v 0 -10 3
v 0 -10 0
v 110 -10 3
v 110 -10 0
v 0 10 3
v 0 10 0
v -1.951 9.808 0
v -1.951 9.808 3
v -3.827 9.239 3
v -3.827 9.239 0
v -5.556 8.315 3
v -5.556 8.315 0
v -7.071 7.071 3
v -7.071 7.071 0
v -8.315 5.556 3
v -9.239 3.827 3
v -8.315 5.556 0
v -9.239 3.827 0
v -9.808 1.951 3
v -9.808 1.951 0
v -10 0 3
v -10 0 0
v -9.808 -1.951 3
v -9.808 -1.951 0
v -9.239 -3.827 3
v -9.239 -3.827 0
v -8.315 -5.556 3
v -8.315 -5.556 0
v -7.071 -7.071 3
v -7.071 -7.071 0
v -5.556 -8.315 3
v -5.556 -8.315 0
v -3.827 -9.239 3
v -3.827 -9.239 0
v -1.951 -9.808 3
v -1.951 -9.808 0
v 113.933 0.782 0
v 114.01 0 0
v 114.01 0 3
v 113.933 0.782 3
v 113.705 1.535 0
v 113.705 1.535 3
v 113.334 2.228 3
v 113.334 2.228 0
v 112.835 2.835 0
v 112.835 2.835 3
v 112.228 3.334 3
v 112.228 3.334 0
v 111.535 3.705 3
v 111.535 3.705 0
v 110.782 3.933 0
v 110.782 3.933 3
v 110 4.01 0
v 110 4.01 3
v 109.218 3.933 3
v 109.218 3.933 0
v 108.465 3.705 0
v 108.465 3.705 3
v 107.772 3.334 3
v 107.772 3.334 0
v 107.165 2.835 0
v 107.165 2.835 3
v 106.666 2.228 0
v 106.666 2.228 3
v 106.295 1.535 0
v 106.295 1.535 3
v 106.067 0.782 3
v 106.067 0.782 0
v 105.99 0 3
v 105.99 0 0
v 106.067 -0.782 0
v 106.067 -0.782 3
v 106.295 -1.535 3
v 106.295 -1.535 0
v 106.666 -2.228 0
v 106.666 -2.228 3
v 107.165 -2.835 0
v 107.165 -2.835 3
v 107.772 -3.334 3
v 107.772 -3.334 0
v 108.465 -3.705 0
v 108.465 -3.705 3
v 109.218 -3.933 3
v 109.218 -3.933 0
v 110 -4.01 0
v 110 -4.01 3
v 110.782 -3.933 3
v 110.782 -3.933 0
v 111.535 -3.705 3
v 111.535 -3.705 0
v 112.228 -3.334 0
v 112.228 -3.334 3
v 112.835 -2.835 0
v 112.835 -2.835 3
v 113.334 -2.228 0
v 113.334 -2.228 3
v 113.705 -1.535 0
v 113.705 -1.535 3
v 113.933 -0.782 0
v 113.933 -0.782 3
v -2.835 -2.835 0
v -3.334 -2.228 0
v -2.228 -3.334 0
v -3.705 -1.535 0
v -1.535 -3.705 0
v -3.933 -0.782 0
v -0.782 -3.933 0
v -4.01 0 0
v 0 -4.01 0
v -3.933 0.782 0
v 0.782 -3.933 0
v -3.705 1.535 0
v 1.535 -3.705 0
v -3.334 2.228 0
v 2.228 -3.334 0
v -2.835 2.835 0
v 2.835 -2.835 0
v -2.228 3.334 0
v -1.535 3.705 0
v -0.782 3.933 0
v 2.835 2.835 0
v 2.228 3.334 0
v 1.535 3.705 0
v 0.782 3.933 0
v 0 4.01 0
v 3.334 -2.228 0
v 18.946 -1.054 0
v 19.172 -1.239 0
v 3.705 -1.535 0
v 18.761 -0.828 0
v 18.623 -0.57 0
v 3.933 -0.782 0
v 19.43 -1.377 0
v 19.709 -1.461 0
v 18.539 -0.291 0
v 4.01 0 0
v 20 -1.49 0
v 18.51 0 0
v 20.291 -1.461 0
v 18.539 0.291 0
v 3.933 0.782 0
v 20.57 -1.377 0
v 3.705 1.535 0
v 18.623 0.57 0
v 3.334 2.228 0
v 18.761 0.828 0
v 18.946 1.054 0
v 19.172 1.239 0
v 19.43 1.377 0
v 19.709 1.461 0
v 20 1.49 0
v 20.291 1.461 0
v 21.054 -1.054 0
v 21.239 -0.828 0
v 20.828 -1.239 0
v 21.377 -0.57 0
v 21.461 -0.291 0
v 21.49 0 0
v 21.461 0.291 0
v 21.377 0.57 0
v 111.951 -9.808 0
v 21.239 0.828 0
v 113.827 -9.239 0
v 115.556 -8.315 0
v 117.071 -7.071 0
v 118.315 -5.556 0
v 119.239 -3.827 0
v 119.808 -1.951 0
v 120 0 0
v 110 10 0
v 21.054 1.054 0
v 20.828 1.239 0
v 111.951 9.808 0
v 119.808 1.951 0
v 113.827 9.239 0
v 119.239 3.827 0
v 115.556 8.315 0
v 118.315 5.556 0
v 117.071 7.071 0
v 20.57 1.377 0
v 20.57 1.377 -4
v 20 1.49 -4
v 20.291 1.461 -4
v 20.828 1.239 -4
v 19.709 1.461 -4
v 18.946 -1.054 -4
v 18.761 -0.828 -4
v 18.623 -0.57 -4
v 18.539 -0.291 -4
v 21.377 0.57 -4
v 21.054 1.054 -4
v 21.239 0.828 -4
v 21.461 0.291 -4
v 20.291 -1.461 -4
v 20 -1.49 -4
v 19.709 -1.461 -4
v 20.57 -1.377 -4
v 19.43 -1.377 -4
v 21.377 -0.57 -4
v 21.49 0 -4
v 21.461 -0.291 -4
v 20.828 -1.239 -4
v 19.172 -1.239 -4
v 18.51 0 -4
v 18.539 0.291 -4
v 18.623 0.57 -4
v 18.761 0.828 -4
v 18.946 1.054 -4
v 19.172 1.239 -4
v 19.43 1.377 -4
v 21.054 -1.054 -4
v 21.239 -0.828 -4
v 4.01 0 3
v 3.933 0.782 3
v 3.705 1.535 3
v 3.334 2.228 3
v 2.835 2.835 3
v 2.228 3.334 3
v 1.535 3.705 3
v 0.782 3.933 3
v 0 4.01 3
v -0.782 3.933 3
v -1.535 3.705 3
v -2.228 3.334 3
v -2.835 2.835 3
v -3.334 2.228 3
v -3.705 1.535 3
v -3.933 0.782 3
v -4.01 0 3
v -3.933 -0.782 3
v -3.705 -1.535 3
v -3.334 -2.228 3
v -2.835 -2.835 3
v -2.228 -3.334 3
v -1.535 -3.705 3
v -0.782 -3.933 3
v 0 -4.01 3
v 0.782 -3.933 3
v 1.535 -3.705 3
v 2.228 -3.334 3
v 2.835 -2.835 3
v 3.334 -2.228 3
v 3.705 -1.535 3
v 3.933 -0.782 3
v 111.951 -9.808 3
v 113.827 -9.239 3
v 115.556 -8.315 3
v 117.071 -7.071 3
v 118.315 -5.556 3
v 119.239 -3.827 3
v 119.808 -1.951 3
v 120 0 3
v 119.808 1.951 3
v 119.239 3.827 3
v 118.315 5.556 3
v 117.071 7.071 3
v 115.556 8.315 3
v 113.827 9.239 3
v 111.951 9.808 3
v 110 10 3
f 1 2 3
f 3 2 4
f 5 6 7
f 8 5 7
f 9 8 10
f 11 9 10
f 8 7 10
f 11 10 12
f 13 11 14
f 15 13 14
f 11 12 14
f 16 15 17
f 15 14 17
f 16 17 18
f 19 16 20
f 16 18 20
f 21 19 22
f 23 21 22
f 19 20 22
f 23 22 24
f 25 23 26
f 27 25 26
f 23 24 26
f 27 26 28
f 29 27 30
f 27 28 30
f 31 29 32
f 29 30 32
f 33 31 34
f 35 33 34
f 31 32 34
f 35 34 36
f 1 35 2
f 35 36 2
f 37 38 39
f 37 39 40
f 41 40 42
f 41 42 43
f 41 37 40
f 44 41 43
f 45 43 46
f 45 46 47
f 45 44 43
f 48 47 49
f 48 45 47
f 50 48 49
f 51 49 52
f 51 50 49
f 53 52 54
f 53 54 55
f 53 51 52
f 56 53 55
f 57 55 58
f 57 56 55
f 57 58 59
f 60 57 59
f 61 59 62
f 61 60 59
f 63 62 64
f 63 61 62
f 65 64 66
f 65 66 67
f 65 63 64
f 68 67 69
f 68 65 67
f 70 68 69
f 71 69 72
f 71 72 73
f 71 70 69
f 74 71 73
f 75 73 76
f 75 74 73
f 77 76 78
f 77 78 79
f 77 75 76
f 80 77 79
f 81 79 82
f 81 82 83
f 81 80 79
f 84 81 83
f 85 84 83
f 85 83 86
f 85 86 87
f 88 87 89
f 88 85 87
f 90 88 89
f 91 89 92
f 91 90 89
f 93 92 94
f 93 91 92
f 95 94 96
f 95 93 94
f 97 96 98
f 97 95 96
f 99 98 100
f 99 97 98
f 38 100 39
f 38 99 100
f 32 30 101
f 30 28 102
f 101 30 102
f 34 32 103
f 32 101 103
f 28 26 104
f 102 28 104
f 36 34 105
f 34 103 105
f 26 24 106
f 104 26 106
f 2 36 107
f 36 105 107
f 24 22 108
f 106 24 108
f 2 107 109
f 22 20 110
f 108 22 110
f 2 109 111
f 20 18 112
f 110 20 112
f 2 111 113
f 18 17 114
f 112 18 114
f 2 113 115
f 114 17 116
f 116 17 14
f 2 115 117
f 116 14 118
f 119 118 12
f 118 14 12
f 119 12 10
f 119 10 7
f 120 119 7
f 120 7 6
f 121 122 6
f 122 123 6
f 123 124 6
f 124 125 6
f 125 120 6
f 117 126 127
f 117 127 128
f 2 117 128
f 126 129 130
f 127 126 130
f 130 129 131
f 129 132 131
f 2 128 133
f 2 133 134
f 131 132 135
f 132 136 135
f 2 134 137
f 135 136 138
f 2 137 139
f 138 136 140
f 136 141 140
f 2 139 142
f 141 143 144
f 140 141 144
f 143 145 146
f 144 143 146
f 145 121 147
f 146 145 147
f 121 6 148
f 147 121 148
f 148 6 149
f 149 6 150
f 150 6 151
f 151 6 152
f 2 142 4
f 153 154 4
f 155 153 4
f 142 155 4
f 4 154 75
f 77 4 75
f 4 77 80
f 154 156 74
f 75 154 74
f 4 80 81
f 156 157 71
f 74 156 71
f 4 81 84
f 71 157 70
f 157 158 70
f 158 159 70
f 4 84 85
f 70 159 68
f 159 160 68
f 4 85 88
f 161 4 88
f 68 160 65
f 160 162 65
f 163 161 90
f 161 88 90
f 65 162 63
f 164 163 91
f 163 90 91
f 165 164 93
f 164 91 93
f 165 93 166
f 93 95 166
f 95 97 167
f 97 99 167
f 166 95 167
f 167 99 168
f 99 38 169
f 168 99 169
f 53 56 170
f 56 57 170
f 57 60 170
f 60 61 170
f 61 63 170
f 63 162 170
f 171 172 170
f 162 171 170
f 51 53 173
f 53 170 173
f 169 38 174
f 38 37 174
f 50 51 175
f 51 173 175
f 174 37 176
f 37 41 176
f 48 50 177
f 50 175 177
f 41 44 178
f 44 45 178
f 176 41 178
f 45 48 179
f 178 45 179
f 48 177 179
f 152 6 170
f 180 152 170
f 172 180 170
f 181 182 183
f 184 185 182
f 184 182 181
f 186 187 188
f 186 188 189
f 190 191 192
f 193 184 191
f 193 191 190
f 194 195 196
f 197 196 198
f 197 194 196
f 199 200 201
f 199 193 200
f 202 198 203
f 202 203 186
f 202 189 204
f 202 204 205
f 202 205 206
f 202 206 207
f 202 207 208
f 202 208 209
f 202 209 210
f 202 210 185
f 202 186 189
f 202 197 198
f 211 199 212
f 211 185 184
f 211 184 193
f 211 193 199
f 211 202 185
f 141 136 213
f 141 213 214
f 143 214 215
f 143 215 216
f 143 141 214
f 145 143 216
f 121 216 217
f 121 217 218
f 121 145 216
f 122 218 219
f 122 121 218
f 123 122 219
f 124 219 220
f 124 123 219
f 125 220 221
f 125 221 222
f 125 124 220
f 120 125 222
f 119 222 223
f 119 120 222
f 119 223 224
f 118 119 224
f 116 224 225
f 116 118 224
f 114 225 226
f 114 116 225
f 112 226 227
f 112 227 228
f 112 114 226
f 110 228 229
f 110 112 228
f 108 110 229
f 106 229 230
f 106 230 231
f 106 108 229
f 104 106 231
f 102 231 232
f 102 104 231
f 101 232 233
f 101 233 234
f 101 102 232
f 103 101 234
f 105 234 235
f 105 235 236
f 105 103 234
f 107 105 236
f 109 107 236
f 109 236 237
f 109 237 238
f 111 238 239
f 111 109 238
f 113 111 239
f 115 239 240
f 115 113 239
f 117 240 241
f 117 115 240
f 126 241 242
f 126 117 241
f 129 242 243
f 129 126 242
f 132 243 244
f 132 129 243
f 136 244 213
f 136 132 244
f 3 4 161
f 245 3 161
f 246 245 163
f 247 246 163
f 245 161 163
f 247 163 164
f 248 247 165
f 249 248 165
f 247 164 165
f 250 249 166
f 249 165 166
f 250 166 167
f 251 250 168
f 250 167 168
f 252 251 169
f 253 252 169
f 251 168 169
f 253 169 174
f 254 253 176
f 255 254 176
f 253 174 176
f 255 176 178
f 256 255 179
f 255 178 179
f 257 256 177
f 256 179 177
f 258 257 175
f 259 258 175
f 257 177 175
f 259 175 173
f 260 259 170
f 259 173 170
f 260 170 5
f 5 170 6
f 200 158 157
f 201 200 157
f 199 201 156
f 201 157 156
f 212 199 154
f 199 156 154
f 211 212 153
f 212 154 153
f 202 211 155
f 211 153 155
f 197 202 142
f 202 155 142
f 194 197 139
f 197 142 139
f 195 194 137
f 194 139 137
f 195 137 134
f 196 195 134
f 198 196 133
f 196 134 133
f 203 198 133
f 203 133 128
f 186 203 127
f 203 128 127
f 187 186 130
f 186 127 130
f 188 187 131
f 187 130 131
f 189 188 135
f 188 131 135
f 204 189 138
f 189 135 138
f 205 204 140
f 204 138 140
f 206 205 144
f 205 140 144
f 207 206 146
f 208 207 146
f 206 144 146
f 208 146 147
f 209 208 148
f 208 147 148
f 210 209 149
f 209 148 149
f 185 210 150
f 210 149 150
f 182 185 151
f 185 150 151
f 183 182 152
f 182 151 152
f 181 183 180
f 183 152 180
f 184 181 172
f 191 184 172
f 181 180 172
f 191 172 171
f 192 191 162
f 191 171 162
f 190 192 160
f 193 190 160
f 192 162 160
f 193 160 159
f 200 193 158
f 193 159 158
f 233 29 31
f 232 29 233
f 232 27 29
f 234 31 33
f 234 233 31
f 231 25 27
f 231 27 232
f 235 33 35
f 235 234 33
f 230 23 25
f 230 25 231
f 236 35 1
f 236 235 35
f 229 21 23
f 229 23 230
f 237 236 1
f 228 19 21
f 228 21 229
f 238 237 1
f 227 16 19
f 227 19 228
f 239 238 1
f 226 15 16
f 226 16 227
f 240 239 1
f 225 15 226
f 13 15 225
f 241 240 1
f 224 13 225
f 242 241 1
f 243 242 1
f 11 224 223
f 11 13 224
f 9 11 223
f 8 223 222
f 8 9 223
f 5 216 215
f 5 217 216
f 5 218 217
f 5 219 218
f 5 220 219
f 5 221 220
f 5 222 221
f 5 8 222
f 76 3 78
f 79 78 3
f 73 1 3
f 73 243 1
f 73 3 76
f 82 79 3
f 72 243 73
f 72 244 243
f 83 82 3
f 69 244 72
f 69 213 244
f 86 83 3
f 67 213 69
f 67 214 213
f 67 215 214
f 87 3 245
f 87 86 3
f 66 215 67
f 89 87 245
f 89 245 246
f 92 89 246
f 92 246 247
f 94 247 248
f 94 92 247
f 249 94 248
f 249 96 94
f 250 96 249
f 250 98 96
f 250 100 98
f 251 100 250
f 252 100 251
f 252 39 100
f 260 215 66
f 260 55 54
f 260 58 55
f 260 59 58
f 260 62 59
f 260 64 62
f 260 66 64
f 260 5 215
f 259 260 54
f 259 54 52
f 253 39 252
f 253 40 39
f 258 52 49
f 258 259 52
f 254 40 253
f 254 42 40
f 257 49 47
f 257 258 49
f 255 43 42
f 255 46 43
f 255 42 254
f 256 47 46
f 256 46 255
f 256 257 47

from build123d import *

# Parameters (mm, degrees)
SKETCH1_R           = 4.01
BOSS_EXTRUDE1_DEPTH = 3
SKETCH2_R           = 1.49
BOSS_EXTRUDE3_DEPTH = 4


with BuildPart() as part:
    # Sketch1 → Boss-Extrude1 (new body)
    with BuildSketch(Plane.XY):
        with BuildLine():
            Line((110, 10), (0, 10))
            ThreePointArc((0, 10), (-10, 0), (0, -10))
            Line((0, -10), (110, -10))
            ThreePointArc((110, -10), (120, 0), (110, 10))
        make_face()
        Circle(SKETCH1_R, mode=Mode.SUBTRACT)
        with Locations((110, 0)):
            Circle(SKETCH1_R, mode=Mode.SUBTRACT)
    extrude(amount=BOSS_EXTRUDE1_DEPTH)

    # Sketch2 → Boss-Extrude3 (add)
    with BuildSketch(Plane(origin=(0, 0, 0), x_dir=(-1, 0, 0), z_dir=(0, 0, -1))):
        with Locations(Location((-20, 0, 0), (0, 0, 180))):
            Circle(SKETCH2_R)
    extrude(amount=BOSS_EXTRUDE3_DEPTH)


solid = part.part
